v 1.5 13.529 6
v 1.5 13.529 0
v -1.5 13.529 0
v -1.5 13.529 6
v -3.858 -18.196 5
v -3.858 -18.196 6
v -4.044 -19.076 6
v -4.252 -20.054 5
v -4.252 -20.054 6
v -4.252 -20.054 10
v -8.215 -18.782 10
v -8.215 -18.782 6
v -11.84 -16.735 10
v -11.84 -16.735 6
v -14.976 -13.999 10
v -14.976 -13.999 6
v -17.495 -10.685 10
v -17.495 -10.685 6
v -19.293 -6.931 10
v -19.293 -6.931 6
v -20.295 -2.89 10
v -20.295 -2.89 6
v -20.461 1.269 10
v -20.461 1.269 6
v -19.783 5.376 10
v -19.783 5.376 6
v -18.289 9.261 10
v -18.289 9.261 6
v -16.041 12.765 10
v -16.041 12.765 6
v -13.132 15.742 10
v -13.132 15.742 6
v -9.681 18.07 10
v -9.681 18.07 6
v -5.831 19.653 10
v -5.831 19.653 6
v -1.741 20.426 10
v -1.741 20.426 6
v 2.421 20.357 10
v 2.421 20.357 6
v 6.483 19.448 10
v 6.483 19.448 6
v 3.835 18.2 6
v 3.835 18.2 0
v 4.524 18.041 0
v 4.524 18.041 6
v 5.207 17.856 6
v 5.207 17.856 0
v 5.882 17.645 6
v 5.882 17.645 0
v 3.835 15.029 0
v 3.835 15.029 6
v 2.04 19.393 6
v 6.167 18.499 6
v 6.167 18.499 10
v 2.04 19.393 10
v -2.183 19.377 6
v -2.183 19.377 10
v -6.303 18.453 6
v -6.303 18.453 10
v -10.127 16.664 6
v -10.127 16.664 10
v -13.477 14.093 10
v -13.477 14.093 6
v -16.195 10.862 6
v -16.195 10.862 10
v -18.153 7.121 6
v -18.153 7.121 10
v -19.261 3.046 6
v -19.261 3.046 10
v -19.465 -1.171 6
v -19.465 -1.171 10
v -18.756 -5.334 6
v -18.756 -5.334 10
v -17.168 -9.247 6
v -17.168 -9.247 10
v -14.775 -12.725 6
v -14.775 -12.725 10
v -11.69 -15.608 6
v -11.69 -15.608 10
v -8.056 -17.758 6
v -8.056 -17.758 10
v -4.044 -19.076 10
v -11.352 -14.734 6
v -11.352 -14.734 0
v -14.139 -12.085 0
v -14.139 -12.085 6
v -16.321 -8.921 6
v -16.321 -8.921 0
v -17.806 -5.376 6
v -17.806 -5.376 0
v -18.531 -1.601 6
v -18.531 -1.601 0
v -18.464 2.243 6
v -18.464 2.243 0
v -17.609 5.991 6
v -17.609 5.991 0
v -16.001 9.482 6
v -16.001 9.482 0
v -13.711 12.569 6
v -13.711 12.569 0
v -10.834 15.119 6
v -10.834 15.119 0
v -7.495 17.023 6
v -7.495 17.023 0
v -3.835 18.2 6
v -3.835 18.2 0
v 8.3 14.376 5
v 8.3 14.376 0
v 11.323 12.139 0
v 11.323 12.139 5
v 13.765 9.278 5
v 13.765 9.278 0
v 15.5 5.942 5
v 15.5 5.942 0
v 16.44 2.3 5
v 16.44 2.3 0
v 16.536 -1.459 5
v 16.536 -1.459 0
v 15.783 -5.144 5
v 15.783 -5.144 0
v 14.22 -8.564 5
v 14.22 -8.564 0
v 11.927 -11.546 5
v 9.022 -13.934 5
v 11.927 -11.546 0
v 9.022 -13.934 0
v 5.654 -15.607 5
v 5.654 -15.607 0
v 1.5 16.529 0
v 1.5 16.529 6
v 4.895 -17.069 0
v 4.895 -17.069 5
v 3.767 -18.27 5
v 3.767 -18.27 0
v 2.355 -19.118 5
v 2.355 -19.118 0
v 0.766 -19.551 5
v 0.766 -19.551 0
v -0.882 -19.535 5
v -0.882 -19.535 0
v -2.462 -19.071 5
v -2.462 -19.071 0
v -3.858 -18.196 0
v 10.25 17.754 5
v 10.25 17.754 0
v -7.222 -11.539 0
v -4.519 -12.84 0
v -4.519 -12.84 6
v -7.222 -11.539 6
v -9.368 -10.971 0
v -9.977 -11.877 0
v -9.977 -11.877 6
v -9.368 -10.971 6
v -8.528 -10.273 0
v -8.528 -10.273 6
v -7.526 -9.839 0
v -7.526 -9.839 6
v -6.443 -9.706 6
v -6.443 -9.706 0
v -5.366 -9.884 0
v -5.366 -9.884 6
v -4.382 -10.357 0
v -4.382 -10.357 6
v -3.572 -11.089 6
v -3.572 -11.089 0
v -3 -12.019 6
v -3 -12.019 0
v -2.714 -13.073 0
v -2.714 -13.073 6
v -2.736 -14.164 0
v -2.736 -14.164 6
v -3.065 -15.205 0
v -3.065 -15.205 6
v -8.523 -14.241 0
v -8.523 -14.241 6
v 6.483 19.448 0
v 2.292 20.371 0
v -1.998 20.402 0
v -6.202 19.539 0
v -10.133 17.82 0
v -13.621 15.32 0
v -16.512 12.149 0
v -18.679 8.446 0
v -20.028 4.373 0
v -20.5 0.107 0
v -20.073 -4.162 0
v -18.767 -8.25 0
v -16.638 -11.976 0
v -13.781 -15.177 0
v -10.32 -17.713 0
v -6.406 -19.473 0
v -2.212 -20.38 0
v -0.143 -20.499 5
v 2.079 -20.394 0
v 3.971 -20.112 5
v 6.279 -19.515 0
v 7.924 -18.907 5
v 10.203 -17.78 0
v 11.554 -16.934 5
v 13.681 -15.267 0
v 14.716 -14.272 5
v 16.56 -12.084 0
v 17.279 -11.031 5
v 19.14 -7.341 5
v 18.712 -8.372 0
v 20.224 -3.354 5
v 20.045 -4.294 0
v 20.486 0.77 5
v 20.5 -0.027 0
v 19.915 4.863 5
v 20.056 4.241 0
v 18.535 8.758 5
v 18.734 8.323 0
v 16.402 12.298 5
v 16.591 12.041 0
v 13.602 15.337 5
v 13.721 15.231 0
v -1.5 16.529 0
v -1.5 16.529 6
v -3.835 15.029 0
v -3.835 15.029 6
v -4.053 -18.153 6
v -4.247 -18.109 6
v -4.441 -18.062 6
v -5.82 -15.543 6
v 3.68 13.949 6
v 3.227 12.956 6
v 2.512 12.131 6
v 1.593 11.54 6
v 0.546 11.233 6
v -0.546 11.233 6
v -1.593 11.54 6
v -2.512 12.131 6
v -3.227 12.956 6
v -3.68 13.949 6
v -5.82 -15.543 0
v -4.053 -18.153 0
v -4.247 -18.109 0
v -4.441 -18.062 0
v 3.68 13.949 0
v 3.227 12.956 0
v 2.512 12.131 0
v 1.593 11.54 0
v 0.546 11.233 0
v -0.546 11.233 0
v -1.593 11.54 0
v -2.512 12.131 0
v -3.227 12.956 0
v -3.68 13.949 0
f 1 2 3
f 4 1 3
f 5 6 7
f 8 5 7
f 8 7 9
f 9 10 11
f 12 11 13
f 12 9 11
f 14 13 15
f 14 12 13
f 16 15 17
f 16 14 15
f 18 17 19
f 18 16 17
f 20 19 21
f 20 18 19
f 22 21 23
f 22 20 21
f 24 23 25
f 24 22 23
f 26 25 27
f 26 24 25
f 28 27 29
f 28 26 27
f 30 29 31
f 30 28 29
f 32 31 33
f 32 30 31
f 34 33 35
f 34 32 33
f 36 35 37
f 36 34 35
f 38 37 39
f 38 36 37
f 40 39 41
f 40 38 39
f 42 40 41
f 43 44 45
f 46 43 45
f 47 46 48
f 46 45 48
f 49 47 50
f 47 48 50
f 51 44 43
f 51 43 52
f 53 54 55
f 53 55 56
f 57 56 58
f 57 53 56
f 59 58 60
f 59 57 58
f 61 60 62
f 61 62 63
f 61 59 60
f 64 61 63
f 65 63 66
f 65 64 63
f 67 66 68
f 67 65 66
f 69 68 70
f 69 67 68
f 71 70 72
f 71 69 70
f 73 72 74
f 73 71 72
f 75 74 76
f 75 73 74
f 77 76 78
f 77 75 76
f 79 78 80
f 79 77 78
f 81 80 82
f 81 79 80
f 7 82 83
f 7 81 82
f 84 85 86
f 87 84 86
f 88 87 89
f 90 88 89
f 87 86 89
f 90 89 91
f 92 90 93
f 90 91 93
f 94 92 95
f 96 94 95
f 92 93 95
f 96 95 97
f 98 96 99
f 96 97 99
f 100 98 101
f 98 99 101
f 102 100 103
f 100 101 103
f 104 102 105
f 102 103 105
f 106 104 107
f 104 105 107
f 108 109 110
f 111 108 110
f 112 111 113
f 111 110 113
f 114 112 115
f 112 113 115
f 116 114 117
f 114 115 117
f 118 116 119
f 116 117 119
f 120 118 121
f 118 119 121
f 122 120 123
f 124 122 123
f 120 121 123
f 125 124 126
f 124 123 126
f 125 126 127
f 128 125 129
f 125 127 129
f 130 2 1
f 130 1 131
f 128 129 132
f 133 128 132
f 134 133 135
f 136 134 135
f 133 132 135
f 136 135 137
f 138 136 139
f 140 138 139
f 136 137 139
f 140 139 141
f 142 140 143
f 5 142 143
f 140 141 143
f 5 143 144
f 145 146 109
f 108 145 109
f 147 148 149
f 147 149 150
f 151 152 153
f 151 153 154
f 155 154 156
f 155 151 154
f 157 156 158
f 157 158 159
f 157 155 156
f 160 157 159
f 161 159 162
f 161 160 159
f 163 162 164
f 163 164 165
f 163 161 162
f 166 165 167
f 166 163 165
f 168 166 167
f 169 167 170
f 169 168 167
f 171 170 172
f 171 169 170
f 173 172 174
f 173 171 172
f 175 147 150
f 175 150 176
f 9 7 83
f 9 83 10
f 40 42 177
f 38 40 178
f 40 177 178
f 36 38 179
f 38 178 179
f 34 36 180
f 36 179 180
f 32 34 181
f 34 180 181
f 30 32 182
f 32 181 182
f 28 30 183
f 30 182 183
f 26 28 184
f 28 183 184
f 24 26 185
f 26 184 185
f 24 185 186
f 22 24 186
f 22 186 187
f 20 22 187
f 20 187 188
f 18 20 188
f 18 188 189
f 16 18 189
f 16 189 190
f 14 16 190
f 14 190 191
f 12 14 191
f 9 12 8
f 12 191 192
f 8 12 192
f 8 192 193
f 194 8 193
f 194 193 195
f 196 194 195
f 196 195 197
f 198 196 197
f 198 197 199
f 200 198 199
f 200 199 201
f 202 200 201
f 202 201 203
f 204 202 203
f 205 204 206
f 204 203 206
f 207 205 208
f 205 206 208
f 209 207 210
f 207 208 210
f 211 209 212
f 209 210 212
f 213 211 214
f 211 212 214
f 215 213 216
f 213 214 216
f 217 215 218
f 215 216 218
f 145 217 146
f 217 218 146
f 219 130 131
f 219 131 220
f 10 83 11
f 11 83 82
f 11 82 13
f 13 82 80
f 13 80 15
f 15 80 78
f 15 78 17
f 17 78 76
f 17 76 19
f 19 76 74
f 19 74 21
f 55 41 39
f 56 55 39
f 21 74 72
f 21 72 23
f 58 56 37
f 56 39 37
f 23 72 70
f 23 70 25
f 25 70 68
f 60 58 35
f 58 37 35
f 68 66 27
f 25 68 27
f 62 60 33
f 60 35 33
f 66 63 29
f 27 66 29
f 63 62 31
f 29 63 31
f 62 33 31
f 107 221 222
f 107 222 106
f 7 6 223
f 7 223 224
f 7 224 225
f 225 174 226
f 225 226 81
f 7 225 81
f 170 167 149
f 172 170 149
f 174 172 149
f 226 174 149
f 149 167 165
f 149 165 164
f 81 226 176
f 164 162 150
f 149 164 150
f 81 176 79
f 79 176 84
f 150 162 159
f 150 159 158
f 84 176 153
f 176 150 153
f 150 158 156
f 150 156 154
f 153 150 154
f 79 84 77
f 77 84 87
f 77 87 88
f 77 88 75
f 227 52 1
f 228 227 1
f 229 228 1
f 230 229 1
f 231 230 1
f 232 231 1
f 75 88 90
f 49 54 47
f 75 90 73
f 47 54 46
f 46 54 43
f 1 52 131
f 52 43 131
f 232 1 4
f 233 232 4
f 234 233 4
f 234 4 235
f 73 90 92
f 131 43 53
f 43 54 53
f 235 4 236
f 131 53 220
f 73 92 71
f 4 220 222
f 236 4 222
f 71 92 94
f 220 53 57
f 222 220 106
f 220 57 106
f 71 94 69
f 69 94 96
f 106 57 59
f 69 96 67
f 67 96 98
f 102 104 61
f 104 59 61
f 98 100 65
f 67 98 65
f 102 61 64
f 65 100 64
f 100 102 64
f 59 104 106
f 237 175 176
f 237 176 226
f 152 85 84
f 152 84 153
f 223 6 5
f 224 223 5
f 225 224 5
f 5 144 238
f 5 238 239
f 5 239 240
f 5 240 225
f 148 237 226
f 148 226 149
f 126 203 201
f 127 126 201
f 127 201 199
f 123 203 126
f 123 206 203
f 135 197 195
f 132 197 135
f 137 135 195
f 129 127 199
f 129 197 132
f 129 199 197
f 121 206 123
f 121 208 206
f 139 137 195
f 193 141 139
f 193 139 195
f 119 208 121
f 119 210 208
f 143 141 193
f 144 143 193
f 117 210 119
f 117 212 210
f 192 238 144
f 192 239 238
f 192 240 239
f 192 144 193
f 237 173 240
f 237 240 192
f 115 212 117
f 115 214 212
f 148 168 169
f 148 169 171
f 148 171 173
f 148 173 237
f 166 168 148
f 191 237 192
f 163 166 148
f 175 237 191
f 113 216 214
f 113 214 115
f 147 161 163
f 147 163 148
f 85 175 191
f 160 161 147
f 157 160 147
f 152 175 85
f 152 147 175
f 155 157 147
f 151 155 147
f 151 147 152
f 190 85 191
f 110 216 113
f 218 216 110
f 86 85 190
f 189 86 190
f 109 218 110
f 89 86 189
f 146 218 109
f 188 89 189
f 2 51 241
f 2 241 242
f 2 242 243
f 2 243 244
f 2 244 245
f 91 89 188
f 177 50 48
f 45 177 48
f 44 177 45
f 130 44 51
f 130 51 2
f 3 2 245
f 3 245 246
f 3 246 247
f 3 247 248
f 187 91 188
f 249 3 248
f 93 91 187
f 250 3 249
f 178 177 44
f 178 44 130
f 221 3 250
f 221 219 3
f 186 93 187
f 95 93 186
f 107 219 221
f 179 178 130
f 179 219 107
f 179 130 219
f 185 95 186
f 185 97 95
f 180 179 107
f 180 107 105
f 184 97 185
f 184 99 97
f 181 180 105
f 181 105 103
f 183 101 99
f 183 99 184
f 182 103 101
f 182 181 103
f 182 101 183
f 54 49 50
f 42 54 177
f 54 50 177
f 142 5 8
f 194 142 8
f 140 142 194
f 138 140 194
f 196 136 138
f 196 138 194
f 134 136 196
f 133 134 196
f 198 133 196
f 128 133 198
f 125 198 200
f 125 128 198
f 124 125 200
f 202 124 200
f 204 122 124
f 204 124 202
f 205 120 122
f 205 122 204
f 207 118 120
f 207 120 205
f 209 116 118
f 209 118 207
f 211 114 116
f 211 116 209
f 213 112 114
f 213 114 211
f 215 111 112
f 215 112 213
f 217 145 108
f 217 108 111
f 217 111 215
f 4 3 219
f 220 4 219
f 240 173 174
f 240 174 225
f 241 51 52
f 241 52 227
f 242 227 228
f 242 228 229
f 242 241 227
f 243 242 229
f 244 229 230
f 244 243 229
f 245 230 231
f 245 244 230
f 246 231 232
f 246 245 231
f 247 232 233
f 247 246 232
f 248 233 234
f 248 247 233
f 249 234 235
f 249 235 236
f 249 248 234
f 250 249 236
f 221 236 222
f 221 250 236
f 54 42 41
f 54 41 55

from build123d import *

# Parameters (mm, degrees)
RESSALTO_EXTRUS_O2_DEPTH = 6
CORTE_EXTRUS_O1_DEPTH    = 1
ESBO_O8_W                = 3
ESBO_O8_H                = 3
RESSALTO_EXTRUS_O4_DEPTH = 6
RESSALTO_EXTRUS_O5_DEPTH = 4


with BuildPart() as part:
    # Esboço4 → Ressalto-extrusão2 (new body)
    with BuildSketch(Plane.XY):
        with BuildLine():
            Line((10.25, 17.753520778), (8.3, 14.376021703))
            ThreePointArc((8.3, 14.376021703), (16.535747837, -1.45912421), (5.654249214, -15.607352941))
            ThreePointArc((5.654249214, -15.607352941), (1.575368798, -19.389491614), (-3.857534027, -18.195588235))
            ThreePointArc((-3.857534027, -18.195588235), (-17.949080324, 4.877552207), (5.882044961, 17.645439838))
            Line((5.882044961, 17.645439838), (6.482899016, 19.447931004))
            ThreePointArc((6.482899016, 19.447931004), (-8.409235035, -18.695848901), (10.25, 17.753520778))
        make_face()
    extrude(amount=RESSALTO_EXTRUS_O2_DEPTH)

    # Esboço7 → Corte-extrusão1 (cut)
    with BuildSketch(Plane.XY.offset(6)):
        with BuildLine():
            Line((-3.857534027, -18.195588235), (-4.251583202, -20.054277356))
            ThreePointArc((-4.251583202, -20.054277356), (19.140340931, -7.341481393), (10.25, 17.753520778))
            Line((10.25, 17.753520778), (8.3, 14.376021703))
            ThreePointArc((8.3, 14.376021703), (16.535747837, -1.45912421), (5.654249214, -15.607352941))
            ThreePointArc((5.654249214, -15.607352941), (1.575368798, -19.389491614), (-3.857534027, -18.195588235))
        make_face()
    extrude(amount=-CORTE_EXTRUS_O1_DEPTH, mode=Mode.SUBTRACT)

    # Esboço8 → Ressalto-extrusão4 (add)
    with BuildSketch(Plane(origin=(0, 0, 0), x_dir=(-1, 0, 0), z_dir=(0, 0, -1))):
        with BuildLine():
            ThreePointArc((9.976510425, -11.876705547), (4.856795522, -10.085239821), (3.065329796, -15.204954723))
            Line((3.065329796, -15.204954723), (5.002459987, -19.227447012))
            Line((5.002459987, -19.227447012), (11.913640616, -15.899197835))
            Line((11.913640616, -15.899197835), (9.976510425, -11.876705547))
        make_face()
        Polygon((5.820292417, -15.543109046), (4.5186412, -12.840202442), (7.221547804, -11.538551224), (8.523199021, -14.241457828), align=None, mode=Mode.SUBTRACT)
        with BuildLine():
            ThreePointArc((-3.835415892, 15.029187597), (0, 11.193771705), (3.835415892, 15.029187597))
            Line((3.835415892, 15.029187597), (3.835415892, 19.493817211))
            Line((3.835415892, 19.493817211), (-3.835415892, 19.493817211))
            Line((-3.835415892, 19.493817211), (-3.835415892, 15.029187597))
        make_face()
        with Locations((0, 15.029187597)):
            Rectangle(ESBO_O8_W, ESBO_O8_H, mode=Mode.SUBTRACT)
    extrude(amount=-RESSALTO_EXTRUS_O4_DEPTH)

    # Esboço9 → Ressalto-extrusão5 (add)
    with BuildSketch(Plane.XY.offset(6)):
        with BuildLine():
            Line((-4.0441889, -19.076019924), (-4.251583202, -20.054277356))
            ThreePointArc((-4.251583202, -20.054277356), (-19.782588529, 5.375796787), (6.482899016, 19.447931004))
            Line((6.482899016, 19.447931004), (6.16666004, 18.499251443))
            ThreePointArc((6.16666004, 18.499251443), (-18.81758421, 5.113562798), (-4.0441889, -19.076019924))
        make_face()
    extrude(amount=RESSALTO_EXTRUS_O5_DEPTH)


solid = part.part
